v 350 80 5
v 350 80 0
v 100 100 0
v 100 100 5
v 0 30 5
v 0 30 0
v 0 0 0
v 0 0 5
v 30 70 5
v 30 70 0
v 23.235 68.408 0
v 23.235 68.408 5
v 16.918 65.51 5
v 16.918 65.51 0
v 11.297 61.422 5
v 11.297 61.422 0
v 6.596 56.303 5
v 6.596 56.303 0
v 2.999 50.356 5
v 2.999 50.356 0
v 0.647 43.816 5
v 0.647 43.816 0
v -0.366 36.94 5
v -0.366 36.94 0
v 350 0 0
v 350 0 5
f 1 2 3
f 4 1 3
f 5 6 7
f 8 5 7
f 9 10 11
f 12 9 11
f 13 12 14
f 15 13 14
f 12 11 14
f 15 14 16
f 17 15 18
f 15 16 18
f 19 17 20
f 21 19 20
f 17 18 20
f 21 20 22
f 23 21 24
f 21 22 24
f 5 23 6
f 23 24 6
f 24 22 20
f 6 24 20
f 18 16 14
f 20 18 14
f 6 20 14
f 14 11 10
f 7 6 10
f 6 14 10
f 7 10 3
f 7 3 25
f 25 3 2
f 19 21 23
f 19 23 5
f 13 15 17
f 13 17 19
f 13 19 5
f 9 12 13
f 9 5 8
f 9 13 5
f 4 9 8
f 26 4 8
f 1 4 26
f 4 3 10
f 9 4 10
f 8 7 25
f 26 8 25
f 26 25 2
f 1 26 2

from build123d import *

# Parameters (mm, degrees)
BOSS_EXTRU_1_DEPTH = 5


with BuildPart() as part:
    # Esquisse1 → Boss.-Extru.1 (new body)
    with BuildSketch(Plane.XY):
        with BuildLine():
            Line((0, 0), (350, 0))
            Line((350, 0), (350, 80))
            Line((350, 80), (100, 100))
            Line((100, 100), (30, 70))
            ThreePointArc((30, 70), (6.595917942, 56.303061543), (0, 30))
            Line((0, 30), (0, 0))
        make_face()
    extrude(amount=BOSS_EXTRU_1_DEPTH)


solid = part.part
